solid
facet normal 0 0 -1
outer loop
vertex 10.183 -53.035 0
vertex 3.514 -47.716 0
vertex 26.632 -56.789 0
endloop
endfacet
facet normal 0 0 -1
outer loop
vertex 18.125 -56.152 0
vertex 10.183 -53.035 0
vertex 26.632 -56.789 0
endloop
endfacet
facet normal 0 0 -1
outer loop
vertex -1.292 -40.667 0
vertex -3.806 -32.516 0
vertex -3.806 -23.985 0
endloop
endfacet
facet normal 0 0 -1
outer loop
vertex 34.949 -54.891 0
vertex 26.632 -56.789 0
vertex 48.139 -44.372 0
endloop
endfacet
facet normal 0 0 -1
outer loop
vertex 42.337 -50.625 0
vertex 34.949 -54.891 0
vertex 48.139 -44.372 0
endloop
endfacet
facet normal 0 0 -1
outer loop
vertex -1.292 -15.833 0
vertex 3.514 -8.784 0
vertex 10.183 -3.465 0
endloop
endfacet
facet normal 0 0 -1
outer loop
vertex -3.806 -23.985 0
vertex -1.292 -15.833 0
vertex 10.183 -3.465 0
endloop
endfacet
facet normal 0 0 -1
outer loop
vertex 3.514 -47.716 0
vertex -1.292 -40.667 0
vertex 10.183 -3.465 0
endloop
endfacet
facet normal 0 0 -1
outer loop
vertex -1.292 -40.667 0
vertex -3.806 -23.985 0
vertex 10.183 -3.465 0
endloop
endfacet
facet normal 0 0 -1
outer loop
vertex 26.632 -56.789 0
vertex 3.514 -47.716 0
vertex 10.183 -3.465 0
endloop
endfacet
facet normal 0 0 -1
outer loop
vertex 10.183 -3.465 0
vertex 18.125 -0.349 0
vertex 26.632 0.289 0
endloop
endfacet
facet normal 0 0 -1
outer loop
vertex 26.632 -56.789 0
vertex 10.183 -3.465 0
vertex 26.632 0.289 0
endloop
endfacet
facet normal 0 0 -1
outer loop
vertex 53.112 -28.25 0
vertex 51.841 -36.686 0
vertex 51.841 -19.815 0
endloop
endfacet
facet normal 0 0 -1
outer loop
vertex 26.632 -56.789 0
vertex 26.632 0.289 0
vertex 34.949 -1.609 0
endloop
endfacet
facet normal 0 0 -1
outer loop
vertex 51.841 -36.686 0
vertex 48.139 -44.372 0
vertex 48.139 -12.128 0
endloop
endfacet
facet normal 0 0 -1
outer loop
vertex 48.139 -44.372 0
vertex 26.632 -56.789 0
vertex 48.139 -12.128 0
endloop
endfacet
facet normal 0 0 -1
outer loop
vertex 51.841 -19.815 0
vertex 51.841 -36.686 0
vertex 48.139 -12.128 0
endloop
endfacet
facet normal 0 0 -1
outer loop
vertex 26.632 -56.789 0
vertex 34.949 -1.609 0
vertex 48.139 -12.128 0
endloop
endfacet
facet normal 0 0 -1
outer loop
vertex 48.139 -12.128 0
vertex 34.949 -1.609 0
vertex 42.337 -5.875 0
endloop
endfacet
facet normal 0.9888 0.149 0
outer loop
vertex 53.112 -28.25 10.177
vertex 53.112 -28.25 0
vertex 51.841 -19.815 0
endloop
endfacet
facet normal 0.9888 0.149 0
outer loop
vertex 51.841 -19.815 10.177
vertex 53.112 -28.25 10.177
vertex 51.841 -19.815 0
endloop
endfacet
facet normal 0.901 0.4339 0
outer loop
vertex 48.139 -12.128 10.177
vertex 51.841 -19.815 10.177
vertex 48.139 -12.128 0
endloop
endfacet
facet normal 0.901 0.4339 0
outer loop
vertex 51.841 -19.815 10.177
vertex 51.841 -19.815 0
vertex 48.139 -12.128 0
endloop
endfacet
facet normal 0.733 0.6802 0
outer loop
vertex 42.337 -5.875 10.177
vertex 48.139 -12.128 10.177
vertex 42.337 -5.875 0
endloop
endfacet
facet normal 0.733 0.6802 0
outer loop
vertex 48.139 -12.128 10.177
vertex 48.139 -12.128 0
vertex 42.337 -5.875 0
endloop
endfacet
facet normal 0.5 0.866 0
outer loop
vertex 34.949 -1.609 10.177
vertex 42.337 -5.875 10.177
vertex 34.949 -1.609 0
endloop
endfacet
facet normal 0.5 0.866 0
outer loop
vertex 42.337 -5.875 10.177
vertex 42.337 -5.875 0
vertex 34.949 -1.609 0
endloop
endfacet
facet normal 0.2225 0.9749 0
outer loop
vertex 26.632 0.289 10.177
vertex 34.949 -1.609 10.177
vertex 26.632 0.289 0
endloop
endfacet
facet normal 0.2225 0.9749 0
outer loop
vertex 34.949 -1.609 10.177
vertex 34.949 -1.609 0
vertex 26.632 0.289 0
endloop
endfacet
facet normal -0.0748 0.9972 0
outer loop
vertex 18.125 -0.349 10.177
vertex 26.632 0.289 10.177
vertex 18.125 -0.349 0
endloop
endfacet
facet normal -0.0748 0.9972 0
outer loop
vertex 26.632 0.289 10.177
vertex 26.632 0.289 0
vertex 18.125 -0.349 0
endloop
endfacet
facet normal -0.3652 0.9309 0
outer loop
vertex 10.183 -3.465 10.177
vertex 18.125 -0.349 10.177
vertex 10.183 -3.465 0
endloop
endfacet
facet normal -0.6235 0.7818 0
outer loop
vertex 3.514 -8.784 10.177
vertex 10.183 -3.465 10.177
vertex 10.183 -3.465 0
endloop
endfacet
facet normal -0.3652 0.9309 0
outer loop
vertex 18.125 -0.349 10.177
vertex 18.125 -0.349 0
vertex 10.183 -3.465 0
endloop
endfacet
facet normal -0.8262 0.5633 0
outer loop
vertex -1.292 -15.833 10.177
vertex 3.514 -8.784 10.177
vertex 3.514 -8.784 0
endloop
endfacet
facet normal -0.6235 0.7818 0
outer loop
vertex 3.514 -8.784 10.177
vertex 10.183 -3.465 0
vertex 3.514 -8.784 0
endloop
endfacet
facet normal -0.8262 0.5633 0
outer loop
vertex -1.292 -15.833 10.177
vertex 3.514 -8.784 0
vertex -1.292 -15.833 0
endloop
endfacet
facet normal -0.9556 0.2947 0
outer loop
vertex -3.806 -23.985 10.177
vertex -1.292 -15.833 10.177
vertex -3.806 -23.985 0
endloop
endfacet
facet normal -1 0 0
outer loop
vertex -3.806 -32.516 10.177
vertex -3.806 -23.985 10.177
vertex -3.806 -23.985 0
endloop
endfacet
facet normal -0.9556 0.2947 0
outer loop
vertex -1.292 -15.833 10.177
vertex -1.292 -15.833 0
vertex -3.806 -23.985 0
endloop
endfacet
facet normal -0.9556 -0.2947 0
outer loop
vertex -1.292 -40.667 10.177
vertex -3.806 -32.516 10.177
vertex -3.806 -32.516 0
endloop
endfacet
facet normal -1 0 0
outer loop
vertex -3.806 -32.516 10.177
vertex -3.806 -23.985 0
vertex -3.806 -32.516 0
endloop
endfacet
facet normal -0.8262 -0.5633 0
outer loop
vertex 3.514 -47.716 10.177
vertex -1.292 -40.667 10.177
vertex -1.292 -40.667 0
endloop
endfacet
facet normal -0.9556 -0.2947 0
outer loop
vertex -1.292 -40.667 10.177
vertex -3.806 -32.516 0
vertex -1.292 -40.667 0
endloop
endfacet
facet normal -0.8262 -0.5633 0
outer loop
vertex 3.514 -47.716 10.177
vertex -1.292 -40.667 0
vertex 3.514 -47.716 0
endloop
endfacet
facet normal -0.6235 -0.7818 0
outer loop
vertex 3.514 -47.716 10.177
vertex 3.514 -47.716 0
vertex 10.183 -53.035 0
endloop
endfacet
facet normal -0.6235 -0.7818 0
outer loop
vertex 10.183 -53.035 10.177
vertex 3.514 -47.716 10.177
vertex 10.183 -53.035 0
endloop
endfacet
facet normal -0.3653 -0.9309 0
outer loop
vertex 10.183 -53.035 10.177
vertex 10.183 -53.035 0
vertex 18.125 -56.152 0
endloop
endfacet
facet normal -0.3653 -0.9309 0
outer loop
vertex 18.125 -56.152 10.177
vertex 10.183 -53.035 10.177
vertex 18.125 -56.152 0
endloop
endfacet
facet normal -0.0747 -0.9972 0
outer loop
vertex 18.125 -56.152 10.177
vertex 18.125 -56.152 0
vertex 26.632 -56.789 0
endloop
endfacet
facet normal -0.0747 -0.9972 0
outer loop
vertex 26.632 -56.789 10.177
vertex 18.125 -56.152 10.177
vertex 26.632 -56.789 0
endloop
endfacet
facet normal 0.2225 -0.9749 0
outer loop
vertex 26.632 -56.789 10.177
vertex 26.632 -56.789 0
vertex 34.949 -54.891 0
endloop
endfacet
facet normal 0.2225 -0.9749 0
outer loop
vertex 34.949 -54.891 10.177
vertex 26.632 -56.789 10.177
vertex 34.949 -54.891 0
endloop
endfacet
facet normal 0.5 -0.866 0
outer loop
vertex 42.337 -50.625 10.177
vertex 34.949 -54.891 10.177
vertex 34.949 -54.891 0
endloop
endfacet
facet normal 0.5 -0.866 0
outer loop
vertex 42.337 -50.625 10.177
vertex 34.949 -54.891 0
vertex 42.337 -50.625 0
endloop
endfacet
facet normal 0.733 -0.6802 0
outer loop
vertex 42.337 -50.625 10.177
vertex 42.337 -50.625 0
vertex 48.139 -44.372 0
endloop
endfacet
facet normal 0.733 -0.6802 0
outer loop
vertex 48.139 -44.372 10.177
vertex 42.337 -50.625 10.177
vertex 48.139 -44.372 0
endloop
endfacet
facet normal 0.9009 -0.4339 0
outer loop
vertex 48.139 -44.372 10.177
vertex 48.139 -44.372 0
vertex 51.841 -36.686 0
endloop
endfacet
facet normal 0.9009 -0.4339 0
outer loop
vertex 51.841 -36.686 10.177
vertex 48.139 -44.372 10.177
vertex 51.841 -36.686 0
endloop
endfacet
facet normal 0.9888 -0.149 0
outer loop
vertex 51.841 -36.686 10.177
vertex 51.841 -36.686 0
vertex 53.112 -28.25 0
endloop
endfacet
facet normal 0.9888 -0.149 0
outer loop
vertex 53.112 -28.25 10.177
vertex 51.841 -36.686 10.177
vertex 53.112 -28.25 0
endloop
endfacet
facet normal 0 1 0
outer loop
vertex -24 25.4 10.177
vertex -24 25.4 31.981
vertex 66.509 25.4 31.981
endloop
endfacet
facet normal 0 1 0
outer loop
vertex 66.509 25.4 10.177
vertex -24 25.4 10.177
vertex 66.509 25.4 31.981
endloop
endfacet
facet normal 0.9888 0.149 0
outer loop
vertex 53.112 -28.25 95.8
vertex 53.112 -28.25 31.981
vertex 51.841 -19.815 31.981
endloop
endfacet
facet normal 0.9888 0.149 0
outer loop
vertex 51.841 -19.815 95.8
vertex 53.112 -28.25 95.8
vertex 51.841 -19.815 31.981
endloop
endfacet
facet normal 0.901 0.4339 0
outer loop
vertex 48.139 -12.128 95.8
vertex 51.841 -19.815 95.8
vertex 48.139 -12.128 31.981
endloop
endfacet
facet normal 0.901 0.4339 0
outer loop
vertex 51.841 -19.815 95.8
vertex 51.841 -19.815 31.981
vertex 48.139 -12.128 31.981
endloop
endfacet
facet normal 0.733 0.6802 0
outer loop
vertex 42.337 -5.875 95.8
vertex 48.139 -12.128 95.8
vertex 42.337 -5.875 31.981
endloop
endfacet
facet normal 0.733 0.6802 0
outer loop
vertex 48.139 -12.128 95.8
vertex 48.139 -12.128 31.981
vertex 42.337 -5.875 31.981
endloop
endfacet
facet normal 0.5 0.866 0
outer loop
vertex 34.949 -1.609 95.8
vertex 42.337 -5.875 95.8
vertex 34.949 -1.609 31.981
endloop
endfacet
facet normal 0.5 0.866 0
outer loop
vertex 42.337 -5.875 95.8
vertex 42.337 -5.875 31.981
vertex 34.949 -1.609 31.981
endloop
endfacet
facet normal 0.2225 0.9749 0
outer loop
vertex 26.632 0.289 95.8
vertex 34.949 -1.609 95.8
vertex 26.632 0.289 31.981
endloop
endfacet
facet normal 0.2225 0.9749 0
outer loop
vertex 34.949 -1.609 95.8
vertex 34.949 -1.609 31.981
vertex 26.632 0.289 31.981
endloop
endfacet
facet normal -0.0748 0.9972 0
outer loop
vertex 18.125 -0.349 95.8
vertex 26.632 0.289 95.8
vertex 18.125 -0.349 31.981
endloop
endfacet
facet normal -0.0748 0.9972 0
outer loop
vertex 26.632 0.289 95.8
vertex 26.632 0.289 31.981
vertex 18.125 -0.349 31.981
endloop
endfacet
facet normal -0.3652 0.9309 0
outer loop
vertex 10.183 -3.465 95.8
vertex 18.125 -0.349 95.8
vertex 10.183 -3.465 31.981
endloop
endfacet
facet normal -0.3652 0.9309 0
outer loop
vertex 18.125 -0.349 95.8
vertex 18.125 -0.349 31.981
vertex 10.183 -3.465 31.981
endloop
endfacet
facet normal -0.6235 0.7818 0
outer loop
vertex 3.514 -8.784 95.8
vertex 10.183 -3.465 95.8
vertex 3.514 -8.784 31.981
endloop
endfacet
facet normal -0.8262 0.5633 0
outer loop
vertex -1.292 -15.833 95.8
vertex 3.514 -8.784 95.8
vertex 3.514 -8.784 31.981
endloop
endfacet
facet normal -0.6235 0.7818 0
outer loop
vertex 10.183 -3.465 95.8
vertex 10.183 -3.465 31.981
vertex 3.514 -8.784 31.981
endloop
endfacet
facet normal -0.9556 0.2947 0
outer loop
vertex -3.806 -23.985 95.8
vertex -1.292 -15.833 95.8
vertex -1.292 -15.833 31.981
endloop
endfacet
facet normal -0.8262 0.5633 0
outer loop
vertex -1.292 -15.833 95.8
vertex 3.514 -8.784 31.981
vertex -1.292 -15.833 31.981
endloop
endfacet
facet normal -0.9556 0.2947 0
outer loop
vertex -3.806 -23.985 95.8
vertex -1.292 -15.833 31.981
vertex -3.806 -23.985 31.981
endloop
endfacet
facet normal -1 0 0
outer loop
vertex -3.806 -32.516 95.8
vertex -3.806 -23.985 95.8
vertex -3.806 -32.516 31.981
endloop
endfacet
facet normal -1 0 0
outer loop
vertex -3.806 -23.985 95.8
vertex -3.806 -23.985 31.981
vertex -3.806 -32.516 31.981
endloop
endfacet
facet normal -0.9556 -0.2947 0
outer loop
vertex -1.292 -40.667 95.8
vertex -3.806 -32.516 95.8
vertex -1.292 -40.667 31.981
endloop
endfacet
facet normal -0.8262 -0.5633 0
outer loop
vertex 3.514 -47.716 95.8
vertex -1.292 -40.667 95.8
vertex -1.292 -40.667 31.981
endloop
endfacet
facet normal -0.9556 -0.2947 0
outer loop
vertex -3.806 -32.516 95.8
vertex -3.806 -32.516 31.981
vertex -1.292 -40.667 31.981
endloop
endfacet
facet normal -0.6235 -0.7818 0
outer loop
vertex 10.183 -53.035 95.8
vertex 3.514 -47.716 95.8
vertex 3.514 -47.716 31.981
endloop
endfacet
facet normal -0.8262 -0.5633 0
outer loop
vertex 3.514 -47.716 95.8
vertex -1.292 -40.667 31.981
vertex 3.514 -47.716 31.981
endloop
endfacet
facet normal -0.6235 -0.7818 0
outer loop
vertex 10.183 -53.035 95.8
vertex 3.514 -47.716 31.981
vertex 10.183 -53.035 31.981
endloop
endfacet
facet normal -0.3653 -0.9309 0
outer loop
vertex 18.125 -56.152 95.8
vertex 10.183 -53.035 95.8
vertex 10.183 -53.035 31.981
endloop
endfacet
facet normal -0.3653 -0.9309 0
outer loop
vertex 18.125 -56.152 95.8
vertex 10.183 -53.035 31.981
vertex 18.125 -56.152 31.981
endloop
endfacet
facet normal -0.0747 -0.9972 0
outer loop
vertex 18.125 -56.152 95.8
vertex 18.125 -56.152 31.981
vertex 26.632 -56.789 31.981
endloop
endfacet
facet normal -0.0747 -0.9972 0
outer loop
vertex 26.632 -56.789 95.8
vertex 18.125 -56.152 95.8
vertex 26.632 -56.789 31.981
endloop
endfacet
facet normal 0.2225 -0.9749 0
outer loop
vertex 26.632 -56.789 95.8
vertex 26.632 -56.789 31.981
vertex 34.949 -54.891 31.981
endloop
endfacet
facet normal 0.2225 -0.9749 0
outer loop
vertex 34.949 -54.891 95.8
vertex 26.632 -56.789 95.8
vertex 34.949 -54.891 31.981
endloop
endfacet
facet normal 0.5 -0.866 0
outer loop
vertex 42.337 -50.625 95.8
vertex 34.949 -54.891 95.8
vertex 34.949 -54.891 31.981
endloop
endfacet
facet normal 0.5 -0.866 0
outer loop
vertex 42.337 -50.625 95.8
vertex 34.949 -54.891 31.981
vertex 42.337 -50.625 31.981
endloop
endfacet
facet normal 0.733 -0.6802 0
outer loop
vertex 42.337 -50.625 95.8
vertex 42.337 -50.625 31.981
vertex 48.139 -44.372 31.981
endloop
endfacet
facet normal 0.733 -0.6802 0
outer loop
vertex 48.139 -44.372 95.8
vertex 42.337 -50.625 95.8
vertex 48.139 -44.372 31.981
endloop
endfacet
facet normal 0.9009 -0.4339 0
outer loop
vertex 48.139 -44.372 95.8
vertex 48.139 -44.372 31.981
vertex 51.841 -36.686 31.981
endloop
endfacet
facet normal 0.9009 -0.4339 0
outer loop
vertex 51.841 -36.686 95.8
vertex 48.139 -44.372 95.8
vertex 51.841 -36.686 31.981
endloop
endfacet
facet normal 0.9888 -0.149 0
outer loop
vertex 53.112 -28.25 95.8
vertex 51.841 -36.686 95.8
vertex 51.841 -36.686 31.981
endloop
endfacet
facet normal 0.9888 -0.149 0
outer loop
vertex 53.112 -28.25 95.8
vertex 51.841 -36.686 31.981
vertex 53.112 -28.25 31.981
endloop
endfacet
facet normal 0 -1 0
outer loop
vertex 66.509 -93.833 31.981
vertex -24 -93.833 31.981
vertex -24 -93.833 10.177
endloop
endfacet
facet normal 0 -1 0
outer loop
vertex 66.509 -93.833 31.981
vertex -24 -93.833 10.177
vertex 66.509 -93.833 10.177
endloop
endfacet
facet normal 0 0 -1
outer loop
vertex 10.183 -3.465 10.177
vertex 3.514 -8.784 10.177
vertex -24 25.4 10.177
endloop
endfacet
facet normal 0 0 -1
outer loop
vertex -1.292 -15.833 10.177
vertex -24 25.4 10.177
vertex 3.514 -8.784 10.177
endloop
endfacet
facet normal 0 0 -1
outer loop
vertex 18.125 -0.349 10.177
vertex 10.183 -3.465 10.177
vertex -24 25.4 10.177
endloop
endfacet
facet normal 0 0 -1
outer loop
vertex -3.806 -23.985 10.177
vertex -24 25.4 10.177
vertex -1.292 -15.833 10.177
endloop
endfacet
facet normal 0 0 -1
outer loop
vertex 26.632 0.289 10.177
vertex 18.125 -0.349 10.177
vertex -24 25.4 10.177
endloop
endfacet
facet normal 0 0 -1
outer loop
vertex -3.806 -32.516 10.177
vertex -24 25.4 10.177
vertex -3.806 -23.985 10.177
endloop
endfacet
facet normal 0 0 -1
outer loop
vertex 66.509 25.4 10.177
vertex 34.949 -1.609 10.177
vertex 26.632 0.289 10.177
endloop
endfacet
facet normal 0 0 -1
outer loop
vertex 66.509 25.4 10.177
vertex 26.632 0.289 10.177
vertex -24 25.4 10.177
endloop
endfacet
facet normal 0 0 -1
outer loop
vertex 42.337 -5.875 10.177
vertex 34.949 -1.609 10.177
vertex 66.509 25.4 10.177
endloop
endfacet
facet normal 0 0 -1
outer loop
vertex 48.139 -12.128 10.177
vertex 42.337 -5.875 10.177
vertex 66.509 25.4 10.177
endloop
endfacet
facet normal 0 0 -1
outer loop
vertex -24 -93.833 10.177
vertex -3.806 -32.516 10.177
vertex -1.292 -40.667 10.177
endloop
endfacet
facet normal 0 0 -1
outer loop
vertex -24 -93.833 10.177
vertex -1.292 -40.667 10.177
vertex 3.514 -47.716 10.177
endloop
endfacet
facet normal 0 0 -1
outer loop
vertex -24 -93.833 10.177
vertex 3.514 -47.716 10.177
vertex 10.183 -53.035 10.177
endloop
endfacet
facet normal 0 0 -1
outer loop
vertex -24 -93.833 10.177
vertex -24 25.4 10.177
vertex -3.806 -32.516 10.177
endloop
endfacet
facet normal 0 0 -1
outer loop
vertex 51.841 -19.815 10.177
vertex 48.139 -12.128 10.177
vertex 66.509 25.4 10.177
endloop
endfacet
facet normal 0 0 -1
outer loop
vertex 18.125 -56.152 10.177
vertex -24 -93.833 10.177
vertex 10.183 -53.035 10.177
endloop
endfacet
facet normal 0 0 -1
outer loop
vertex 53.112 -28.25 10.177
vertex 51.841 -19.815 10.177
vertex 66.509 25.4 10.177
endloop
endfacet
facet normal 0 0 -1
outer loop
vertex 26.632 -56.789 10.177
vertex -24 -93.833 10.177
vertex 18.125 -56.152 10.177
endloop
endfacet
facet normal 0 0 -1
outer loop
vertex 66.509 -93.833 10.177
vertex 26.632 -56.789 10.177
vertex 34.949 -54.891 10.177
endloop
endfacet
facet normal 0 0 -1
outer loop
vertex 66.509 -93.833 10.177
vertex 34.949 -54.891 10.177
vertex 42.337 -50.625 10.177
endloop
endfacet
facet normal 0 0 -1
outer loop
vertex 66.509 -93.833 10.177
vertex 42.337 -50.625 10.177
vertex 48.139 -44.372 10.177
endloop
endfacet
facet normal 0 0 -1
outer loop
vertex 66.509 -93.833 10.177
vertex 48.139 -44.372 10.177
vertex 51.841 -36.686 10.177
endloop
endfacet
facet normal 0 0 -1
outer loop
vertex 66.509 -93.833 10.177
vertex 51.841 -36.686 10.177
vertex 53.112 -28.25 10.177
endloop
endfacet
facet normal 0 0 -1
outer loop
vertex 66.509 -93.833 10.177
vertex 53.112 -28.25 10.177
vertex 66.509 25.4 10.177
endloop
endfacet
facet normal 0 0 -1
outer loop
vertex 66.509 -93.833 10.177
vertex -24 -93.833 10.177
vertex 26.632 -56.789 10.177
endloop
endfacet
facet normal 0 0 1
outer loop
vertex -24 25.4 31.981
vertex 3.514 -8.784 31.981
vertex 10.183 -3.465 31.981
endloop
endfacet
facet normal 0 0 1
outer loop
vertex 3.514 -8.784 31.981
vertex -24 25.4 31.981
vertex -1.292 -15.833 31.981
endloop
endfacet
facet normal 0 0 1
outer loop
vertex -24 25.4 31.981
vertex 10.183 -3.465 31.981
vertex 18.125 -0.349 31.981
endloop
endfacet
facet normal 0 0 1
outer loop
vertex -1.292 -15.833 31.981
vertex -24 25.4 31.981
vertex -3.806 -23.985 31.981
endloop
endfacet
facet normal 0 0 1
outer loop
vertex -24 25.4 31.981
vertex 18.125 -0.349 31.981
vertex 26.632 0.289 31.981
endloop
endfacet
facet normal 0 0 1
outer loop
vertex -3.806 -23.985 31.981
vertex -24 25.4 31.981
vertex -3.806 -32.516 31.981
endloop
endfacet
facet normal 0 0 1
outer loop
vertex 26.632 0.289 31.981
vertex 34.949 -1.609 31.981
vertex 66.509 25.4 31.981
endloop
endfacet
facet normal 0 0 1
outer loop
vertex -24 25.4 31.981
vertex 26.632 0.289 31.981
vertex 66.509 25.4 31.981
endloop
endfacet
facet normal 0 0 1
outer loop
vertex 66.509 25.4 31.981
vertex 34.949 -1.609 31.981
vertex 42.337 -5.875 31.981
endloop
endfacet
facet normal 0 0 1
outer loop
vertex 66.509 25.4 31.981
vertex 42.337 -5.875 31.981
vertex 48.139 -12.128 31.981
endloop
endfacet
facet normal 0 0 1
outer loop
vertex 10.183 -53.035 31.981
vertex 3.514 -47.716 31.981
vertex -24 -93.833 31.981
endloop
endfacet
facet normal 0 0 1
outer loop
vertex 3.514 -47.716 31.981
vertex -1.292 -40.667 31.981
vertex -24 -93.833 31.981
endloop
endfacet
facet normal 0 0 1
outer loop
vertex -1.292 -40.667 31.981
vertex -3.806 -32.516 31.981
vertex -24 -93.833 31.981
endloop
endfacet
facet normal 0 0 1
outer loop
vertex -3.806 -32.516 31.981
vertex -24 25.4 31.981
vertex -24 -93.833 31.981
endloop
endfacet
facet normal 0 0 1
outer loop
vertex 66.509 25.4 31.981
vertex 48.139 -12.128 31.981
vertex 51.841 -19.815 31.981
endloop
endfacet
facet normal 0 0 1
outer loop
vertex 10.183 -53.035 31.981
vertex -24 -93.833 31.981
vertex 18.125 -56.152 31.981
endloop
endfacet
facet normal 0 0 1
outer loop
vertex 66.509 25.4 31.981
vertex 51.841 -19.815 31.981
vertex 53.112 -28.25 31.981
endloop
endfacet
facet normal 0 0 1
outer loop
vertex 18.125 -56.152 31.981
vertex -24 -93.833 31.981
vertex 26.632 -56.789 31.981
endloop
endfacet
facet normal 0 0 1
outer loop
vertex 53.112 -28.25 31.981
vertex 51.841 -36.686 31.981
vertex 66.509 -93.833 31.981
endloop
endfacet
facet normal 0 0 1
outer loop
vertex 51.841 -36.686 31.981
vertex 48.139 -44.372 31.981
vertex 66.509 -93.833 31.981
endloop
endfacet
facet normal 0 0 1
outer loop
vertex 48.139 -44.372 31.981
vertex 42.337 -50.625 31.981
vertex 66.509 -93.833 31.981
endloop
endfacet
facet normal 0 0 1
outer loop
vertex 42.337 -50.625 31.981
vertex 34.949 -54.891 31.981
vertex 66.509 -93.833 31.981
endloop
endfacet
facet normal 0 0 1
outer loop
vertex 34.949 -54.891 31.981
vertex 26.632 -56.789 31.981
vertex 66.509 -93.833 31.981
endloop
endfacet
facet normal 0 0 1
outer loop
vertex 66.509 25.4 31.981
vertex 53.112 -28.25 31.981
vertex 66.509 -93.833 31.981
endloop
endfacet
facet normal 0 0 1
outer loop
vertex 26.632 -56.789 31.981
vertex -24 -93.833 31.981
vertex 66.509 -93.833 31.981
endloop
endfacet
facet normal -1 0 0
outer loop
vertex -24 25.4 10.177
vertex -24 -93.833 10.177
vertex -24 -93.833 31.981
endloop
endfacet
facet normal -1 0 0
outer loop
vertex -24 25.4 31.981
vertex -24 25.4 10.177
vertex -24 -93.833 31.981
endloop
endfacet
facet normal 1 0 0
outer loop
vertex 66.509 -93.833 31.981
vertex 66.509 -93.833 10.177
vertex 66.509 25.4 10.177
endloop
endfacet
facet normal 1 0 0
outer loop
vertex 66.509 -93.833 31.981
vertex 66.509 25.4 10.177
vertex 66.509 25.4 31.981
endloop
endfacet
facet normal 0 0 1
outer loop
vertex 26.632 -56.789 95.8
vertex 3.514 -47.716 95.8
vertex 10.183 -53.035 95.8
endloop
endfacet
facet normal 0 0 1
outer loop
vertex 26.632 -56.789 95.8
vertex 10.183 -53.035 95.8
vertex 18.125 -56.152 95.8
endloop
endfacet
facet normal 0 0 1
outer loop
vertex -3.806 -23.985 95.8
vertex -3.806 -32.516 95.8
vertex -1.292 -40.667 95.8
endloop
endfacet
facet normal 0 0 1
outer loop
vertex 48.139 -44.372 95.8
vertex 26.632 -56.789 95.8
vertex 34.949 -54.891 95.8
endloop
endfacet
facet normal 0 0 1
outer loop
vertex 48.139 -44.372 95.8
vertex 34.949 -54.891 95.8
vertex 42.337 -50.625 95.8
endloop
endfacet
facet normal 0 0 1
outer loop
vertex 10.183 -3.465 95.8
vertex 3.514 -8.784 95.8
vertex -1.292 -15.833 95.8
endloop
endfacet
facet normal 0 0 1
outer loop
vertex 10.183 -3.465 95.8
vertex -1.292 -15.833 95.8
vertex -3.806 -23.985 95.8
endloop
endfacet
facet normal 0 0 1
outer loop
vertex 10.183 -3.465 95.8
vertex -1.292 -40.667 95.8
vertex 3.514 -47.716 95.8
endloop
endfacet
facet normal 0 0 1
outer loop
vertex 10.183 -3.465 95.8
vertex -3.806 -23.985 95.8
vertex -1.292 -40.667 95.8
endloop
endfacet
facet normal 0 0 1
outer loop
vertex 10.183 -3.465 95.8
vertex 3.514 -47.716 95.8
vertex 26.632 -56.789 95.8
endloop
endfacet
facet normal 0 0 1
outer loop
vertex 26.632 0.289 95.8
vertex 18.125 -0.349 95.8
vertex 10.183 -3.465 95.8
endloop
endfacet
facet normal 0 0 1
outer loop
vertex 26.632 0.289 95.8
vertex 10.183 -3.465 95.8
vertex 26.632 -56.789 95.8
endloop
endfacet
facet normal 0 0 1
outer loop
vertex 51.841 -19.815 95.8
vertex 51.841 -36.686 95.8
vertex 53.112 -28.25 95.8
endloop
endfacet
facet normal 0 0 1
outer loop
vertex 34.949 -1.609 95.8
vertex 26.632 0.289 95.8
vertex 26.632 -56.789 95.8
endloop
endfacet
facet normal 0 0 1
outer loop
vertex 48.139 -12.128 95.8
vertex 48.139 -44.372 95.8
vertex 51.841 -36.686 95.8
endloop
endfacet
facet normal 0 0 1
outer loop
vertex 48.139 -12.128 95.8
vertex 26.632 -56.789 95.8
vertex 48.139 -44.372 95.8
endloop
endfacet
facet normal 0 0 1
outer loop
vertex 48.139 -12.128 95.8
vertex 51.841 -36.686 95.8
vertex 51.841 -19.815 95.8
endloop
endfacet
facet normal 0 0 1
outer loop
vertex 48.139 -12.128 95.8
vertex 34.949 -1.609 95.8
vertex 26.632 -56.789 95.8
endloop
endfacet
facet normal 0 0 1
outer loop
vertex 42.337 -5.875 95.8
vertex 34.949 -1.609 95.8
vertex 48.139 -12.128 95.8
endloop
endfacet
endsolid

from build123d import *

# Parameters (mm, degrees)
F0_R          = 28.619022
F1_DEPTH      = 95.800422
F2_W          = 90.508705
F2_H          = 21.804128
F3_DEPTH      = 93.832932
F3_DEPTH_BACK = 25.4


with BuildPart() as f1:
    # F0 (on Top) → F1 (new body)
    with BuildSketch(Plane.XY):
        with Locations((24.492977, -28.250135)):
            Circle(F0_R)
    extrude(amount=F1_DEPTH)

    # F2 (on Front) → F3 (join, two sides)
    with BuildSketch(Plane.XZ) as f3_sk:
        with Locations((21.254842, 21.079259)):
            Rectangle(F2_W, F2_H)
    extrude(amount=F3_DEPTH)
    extrude(f3_sk.sketch, amount=-F3_DEPTH_BACK)


solid = f1.part
